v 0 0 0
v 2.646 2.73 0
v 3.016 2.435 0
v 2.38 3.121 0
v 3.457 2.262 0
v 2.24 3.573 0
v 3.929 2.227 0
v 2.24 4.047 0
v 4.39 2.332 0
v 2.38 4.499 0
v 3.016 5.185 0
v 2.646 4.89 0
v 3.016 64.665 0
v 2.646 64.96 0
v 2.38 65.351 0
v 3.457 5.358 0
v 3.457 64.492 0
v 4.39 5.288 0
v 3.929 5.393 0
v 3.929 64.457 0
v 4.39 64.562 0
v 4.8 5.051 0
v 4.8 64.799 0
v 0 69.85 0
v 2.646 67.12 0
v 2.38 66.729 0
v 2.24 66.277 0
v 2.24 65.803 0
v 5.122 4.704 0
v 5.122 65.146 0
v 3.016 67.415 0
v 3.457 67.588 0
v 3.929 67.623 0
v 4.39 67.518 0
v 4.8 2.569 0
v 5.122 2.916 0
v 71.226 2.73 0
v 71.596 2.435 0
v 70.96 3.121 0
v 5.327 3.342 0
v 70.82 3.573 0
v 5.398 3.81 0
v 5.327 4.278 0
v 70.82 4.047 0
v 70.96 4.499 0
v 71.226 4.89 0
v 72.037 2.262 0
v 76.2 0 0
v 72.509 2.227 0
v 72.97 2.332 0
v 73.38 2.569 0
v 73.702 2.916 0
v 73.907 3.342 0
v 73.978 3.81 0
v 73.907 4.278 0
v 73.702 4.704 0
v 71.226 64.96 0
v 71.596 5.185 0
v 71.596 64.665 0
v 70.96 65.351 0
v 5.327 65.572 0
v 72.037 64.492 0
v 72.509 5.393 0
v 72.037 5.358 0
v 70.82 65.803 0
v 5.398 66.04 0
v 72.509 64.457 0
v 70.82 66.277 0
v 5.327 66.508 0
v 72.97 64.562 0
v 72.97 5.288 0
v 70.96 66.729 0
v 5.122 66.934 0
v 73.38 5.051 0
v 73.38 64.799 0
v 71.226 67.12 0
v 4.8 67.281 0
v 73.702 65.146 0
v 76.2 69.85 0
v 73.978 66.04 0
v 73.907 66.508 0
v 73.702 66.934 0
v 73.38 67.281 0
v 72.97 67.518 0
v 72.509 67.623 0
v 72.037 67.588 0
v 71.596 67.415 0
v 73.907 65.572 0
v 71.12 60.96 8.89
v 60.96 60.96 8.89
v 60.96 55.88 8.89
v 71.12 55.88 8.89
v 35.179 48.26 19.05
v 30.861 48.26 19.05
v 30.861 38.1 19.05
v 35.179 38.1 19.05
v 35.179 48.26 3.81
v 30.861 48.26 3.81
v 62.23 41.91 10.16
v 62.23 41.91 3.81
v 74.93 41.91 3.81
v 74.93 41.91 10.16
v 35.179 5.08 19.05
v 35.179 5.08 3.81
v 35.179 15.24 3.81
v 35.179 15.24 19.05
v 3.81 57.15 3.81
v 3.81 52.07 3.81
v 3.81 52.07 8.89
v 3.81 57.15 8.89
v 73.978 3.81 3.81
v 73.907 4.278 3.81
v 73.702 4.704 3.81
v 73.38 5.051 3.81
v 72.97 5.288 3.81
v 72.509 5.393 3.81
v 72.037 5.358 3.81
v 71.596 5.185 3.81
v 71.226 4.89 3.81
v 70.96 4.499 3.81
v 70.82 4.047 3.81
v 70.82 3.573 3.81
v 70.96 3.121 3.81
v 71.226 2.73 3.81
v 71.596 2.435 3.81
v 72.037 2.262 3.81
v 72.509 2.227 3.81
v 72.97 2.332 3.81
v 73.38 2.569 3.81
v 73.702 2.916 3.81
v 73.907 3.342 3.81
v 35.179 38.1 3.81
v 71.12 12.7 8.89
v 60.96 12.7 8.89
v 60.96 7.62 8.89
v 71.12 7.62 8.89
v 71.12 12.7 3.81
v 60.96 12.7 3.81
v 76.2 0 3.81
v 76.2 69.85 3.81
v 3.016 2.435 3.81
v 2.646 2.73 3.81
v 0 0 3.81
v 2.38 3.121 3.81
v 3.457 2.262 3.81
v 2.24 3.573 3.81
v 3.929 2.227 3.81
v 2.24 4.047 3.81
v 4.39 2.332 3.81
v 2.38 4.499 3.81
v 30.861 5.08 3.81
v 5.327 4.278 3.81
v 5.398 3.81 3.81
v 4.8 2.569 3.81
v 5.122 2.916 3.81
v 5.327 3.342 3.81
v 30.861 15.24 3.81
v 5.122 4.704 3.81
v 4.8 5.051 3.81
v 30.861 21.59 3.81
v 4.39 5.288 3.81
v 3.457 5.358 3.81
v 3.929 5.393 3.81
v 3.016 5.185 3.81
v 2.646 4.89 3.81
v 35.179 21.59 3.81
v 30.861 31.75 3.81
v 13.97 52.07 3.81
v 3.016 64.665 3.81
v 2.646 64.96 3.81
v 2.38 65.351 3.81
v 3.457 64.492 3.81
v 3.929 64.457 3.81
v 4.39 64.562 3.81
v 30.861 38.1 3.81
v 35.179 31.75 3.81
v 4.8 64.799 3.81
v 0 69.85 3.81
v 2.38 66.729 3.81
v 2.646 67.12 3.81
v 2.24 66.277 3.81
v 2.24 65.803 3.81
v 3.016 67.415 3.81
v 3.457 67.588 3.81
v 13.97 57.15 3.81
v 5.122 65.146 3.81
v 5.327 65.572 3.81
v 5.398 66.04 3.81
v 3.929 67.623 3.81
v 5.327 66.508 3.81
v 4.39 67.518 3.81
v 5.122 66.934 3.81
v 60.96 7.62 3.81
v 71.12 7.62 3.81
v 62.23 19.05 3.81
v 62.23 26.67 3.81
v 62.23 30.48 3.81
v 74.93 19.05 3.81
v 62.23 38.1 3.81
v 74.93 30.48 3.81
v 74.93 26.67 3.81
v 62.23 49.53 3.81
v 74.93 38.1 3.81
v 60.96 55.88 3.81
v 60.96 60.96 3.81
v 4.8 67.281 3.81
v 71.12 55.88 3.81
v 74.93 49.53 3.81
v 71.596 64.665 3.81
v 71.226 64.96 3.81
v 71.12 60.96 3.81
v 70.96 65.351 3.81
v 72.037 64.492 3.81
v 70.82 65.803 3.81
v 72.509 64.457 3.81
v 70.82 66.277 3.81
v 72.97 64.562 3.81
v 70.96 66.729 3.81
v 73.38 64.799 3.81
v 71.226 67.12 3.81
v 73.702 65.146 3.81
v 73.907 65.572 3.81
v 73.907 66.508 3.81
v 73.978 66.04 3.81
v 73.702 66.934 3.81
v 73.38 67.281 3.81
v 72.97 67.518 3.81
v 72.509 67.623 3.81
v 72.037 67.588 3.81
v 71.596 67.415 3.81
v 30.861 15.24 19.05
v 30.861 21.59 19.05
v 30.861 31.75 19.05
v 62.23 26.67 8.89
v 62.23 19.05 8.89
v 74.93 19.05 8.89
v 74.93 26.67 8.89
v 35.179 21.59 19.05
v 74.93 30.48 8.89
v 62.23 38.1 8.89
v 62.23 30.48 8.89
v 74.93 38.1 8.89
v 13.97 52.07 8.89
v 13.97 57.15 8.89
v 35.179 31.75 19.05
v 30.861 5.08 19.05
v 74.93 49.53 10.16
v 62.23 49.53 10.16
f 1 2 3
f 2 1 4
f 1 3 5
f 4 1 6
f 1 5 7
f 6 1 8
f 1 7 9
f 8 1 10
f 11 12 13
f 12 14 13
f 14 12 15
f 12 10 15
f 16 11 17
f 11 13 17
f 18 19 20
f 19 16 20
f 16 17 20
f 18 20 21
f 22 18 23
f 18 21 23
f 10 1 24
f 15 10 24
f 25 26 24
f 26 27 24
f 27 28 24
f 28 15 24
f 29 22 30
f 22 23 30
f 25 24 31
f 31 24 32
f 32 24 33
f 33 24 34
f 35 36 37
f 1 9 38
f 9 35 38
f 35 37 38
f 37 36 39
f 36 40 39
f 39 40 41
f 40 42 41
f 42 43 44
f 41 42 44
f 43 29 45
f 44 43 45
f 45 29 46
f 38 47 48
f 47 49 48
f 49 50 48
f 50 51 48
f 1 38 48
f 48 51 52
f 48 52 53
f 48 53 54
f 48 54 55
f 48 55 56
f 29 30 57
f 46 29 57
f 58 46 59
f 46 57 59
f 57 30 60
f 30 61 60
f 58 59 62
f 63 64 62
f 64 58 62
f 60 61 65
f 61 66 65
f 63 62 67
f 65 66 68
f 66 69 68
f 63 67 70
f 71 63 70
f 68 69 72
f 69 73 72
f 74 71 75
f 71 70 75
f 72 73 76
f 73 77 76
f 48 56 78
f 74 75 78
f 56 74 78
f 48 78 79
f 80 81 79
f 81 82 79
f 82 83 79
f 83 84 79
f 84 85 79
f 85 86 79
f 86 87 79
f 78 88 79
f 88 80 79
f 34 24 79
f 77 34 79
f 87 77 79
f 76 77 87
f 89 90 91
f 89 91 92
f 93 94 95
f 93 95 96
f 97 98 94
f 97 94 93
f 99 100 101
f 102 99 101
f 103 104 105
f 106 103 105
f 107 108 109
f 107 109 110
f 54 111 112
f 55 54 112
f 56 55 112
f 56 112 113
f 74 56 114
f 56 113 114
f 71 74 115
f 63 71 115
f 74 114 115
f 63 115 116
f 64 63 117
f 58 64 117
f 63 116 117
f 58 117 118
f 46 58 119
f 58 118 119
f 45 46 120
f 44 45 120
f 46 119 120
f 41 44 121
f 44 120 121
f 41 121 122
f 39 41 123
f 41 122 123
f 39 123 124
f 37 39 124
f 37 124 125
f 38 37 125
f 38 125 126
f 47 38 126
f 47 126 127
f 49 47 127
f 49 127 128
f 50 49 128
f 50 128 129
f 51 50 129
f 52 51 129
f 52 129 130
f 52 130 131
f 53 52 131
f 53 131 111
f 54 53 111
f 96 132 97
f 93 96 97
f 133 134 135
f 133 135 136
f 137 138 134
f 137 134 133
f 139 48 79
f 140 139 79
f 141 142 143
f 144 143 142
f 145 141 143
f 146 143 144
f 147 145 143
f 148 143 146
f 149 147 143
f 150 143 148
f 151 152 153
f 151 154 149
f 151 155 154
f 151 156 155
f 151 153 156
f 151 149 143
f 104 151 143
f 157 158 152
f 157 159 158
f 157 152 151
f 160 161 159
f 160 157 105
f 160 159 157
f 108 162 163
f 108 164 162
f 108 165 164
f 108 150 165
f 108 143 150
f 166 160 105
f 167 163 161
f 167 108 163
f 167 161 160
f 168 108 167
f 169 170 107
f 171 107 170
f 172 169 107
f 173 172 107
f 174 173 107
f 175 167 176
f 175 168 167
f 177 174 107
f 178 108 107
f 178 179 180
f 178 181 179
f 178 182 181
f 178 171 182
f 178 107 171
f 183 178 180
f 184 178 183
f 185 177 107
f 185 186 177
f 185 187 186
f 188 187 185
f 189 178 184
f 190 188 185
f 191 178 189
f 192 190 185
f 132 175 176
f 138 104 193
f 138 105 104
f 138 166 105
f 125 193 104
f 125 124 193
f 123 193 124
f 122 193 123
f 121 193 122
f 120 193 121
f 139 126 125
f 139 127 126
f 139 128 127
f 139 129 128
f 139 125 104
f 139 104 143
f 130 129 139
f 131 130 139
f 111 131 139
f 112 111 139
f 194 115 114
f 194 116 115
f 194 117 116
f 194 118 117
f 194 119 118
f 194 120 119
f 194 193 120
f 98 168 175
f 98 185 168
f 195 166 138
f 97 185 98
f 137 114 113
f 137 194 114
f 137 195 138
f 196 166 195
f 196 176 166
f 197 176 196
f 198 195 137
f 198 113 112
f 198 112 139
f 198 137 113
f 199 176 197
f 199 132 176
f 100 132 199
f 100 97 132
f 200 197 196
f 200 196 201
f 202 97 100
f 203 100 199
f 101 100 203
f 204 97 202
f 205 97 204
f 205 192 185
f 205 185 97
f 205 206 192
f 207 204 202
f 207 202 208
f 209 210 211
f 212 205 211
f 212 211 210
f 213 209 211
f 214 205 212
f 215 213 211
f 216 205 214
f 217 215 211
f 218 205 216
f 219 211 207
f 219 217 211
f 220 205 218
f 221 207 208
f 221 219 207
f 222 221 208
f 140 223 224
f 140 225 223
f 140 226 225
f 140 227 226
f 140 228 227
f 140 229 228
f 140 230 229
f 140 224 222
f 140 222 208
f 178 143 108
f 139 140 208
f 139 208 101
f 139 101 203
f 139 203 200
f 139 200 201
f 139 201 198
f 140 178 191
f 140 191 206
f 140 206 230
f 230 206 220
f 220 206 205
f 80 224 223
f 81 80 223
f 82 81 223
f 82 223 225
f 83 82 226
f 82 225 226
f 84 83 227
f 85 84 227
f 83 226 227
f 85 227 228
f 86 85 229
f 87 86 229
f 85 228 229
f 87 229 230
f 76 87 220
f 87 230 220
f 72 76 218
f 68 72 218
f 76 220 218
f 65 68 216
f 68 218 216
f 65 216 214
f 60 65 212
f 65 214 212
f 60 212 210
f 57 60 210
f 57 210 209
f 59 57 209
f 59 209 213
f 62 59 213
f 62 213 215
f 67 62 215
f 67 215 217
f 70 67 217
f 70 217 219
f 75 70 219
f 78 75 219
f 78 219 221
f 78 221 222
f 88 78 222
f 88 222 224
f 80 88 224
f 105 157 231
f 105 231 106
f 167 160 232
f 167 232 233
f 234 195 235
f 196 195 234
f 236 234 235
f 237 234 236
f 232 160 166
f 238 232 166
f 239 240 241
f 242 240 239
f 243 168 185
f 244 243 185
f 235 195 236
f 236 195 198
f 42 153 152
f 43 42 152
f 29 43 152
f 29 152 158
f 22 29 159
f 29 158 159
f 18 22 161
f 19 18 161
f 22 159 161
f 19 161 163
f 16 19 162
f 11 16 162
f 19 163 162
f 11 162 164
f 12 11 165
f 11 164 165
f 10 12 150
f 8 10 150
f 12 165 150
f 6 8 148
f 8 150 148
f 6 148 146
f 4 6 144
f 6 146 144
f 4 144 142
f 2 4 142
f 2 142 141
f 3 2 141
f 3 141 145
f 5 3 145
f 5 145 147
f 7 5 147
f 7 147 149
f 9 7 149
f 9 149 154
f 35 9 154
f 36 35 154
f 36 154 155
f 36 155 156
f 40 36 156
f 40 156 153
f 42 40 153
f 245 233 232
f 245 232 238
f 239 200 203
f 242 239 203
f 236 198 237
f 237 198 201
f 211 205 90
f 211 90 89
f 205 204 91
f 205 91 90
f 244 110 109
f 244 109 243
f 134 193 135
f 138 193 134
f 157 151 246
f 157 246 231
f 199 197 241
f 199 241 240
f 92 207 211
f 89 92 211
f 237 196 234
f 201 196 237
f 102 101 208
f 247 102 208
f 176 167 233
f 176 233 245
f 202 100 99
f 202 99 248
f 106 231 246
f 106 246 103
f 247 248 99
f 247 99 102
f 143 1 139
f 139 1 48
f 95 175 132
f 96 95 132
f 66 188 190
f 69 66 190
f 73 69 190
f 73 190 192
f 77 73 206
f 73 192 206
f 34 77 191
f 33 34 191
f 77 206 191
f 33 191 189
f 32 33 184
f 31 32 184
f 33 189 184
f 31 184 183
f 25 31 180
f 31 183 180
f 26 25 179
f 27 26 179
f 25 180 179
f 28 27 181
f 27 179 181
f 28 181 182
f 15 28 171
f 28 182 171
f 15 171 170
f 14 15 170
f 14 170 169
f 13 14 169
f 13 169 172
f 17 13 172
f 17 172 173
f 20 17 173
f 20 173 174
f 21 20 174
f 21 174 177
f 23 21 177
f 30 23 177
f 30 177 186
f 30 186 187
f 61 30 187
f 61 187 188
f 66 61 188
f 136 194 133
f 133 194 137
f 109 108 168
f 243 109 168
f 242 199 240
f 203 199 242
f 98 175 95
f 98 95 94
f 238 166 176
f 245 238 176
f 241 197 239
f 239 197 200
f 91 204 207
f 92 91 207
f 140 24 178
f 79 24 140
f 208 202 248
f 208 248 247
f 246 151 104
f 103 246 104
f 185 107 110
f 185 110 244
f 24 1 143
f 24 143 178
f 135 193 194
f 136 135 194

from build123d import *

# Parameters (mm, degrees)
SKETCH1_W           = 76.2
SKETCH1_H           = 69.85
BOSS_EXTRUDE1_DEPTH = 3.81
SKETCH2_R           = 1.5875
CUT_EXTRUDE1_DEPTH  = 104.440700887
SKETCH3_W           = 12.7
SKETCH3_H           = 7.62
BOSS_EXTRUDE2_DEPTH = 6.35
SKETCH3_4_W         = 10.16
SKETCH3_4_H         = 5.08
SKETCH3_4_W_2       = 12.7
SKETCH3_4_H_2       = 7.62
BOSS_EXTRUDE3_DEPTH = 5.08
SKETCH6_W           = 4.318
SKETCH6_H           = 10.16
BOSS_EXTRUDE4_DEPTH = 15.24


with BuildPart() as part:
    # Sketch1 → Boss-Extrude1 (new body)
    with BuildSketch(Plane.XY):
        with Locations((38.1, 34.925)):
            Rectangle(SKETCH1_W, SKETCH1_H)
    extrude(amount=BOSS_EXTRUDE1_DEPTH)

    # Sketch2 → Cut-Extrude1 (cut, through all)
    with BuildSketch(Plane.XY.offset(3.81)):
        with Locations((3.81, 66.04)):
            Circle(SKETCH2_R)
        with Locations((72.39, 66.04)):
            Circle(SKETCH2_R)
        with Locations((72.39, 3.81)):
            Circle(SKETCH2_R)
        with Locations((3.81, 3.81)):
            Circle(SKETCH2_R)
    extrude(amount=-CUT_EXTRUDE1_DEPTH, mode=Mode.SUBTRACT)

    # Sketch3 → Boss-Extrude2 (add)
    with BuildSketch(Plane.XY.offset(3.81)):
        with Locations((68.58, 45.72)):
            Rectangle(SKETCH3_W, SKETCH3_H)
    extrude(amount=BOSS_EXTRUDE2_DEPTH)

    # Sketch3<4> → Boss-Extrude3 (add)
    with BuildSketch(Plane.XY.offset(3.81)):
        with Locations((8.89, 54.61)):
            Rectangle(SKETCH3_4_W, SKETCH3_4_H)
        with Locations((66.04, 58.42)):
            Rectangle(SKETCH3_4_W, SKETCH3_4_H)
        with Locations((68.58, 45.72)):
            Rectangle(SKETCH3_4_W_2, SKETCH3_4_H_2)
        with Locations((68.58, 34.29)):
            Rectangle(SKETCH3_4_W_2, SKETCH3_4_H_2)
        with Locations((68.58, 22.86)):
            Rectangle(SKETCH3_4_W_2, SKETCH3_4_H_2)
        with Locations((66.04, 10.16)):
            Rectangle(SKETCH3_4_W, SKETCH3_4_H)
    extrude(amount=BOSS_EXTRUDE3_DEPTH)

    # Sketch6 → Boss-Extrude4 (add)
    with BuildSketch(Plane.XY.offset(3.81)):
        with Locations((33.02, 43.18)):
            Rectangle(SKETCH6_W, SKETCH6_H)
        with Locations((33.02, 26.67)):
            Rectangle(SKETCH6_W, SKETCH6_H)
        with Locations((33.02, 10.16)):
            Rectangle(SKETCH6_W, SKETCH6_H)
    extrude(amount=BOSS_EXTRUDE4_DEPTH)


solid = part.part
